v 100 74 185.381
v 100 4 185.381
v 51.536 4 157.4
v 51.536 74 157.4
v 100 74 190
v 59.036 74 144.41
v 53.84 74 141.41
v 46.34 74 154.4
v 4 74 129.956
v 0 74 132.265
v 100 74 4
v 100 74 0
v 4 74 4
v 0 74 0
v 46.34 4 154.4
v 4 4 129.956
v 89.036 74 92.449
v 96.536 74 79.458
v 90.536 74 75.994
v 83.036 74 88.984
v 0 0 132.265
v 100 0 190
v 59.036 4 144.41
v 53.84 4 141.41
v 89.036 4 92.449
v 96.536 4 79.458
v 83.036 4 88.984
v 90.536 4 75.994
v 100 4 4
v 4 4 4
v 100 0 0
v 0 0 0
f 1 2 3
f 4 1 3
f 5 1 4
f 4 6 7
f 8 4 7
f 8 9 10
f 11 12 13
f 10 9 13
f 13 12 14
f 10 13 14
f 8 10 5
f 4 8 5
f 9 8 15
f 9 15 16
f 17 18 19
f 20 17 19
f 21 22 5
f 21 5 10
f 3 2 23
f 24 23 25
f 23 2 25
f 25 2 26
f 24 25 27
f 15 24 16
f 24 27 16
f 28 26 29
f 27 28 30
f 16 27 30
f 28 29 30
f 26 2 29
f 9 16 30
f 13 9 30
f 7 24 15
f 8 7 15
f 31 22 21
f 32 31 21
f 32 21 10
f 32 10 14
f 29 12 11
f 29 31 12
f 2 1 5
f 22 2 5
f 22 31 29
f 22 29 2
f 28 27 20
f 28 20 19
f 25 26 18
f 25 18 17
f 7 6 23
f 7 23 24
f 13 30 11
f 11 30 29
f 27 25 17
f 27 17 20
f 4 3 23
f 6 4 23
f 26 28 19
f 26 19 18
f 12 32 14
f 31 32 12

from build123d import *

# Parameters (mm, degrees)
EXTRUDE_1_DEPTH = 74
SHELL_1_T       = -4
EXTRUDE_2_DEPTH = 70


with BuildPart() as part:
    # 草图1 → 凸台-拉伸1 (new body)
    with BuildSketch(Plane(origin=(0, 0, 0), x_dir=(1, 0, 0), z_dir=(0, 1, 0))):
        Polygon((0, 0), (100, 0), (100, -190), (0, -132.264973081), align=None)
    extrude(amount=EXTRUDE_1_DEPTH)

    # 抽壳1
    shell_1_openings = [part.faces().sort_by_distance(p)[0] for p in [
        (52.985898342, 74, 81.428197876),
        (100, 37, 95),
    ]]
    offset(amount=SHELL_1_T, openings=shell_1_openings, kind=Kind.INTERSECTION)

    # 草图2 → 凸台-拉伸2 (add)
    with BuildSketch(Plane(origin=(0, 4, 0), x_dir=(1, 0, 0), z_dir=(0, 1, 0))):
        Polygon((96.535898385, -79.458149392), (89.035898385, -92.448530449), (83.035898385, -88.984428834), (90.535898385, -75.994047777), align=None)
        Polygon((51.535898385, -157.400435733), (59.035898385, -144.410054676), (53.839745962, -141.410054676), (46.339745962, -154.400435733), align=None)
    extrude(amount=EXTRUDE_2_DEPTH)


solid = part.part
